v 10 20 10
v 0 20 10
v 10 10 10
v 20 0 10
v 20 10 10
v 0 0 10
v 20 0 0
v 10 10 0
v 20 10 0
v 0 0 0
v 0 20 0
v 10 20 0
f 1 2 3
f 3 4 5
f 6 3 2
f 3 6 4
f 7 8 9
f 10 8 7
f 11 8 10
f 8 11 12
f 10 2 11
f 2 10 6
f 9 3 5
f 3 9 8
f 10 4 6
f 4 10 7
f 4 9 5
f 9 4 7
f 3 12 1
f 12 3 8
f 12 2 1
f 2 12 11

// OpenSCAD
// Mating faces only: no volume overlap, so no collision is reported.
cube(10);
translate([10, 0, 0]) cube(10);
translate([0, 10, 0]) cube(10);
